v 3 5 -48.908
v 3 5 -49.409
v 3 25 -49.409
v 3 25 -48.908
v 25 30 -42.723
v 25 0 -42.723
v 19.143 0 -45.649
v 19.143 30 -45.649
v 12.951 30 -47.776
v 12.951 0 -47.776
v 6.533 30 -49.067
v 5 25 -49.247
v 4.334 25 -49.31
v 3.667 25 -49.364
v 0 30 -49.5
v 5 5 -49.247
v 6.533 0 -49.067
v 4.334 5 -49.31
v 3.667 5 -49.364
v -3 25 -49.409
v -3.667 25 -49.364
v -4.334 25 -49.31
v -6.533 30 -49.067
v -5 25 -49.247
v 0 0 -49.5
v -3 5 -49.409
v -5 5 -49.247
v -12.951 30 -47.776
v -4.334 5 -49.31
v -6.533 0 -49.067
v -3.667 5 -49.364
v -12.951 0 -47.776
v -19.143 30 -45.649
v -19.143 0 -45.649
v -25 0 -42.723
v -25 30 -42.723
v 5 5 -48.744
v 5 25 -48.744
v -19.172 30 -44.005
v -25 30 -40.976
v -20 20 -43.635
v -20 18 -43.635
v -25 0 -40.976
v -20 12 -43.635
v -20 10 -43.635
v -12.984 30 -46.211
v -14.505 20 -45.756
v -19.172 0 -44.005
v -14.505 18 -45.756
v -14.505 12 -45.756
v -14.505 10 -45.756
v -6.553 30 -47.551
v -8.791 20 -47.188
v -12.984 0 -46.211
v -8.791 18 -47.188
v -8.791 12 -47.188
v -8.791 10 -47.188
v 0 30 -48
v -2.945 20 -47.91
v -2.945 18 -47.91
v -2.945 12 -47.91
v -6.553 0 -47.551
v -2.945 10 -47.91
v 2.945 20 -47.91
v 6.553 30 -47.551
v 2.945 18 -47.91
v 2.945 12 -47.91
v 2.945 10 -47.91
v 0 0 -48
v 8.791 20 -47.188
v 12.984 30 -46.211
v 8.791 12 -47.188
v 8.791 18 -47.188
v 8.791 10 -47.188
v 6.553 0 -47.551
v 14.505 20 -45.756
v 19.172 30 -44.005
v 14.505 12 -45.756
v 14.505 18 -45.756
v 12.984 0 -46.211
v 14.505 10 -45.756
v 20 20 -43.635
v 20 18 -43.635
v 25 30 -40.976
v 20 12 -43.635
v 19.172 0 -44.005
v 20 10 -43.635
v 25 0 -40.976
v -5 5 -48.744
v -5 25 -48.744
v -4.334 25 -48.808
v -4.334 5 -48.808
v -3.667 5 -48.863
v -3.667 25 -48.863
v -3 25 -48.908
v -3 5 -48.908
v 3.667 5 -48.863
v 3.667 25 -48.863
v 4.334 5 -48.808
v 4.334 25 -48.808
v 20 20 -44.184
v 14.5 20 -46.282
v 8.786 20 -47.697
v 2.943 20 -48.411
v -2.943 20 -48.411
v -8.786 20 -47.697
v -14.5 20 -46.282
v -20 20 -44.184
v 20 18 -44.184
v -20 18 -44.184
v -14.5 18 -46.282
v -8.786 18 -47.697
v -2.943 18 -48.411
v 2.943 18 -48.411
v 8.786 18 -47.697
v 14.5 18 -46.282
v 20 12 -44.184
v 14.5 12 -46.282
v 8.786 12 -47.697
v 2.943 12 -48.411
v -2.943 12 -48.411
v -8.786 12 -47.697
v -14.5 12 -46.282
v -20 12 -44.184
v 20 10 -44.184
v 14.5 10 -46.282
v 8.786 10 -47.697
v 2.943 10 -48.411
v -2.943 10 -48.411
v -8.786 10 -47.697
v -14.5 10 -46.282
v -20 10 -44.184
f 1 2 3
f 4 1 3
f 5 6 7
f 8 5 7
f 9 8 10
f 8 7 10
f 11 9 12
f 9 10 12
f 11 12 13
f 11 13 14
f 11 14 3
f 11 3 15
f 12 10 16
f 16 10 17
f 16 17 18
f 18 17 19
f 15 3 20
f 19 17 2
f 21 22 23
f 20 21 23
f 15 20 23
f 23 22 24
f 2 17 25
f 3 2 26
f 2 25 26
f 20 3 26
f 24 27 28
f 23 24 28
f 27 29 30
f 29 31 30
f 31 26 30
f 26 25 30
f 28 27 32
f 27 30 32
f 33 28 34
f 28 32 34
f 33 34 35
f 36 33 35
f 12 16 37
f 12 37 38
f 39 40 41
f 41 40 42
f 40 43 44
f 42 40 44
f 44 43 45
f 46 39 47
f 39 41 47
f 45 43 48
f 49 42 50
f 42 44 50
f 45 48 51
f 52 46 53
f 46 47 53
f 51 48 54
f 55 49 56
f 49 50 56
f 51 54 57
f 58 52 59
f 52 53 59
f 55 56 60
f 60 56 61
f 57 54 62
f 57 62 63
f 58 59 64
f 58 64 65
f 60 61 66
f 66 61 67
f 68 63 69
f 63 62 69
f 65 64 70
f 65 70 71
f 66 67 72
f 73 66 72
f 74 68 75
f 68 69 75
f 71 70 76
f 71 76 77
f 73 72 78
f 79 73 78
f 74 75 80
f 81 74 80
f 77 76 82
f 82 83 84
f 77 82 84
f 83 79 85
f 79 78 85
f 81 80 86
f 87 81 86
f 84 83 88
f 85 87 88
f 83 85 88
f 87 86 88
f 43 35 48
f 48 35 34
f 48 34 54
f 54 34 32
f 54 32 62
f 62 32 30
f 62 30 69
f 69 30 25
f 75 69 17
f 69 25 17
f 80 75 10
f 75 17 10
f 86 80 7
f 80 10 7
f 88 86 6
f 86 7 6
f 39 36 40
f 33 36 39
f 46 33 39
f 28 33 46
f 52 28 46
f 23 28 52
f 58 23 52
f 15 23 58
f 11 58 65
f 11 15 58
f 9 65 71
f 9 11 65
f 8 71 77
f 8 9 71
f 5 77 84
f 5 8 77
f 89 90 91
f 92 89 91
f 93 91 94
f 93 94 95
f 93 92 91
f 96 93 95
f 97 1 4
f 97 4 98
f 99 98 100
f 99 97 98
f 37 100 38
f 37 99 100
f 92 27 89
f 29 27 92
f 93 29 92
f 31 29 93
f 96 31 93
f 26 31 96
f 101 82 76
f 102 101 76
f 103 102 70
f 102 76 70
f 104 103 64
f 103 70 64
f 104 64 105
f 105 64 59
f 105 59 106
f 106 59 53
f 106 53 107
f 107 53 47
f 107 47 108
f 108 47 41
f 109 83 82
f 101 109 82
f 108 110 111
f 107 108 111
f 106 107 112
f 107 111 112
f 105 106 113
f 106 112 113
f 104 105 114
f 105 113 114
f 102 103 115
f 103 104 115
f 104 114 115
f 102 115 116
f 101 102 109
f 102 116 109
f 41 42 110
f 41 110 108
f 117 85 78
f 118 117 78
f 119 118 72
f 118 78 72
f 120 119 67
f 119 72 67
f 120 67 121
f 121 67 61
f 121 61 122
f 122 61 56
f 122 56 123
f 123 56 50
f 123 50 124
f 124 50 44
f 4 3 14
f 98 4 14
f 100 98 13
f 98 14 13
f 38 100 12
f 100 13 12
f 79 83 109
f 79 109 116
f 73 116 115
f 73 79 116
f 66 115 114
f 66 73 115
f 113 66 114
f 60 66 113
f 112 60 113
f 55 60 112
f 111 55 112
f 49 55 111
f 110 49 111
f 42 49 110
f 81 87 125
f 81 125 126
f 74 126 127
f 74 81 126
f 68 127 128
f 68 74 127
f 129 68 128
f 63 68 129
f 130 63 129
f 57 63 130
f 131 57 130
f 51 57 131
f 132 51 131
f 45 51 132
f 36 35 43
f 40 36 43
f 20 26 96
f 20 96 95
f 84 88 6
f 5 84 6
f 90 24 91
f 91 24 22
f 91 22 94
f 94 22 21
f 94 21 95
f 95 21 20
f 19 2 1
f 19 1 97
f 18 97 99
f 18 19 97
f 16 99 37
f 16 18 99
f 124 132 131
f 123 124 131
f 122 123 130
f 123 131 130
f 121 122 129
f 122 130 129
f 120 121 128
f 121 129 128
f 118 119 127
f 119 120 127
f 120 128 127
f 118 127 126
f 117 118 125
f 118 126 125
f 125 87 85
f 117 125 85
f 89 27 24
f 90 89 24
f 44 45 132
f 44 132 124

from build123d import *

# Parameters (mm, degrees)
BOSS_EXTRUDE1_DEPTH      = 30
CUT_EXTRUDE28_REACH      = 65.05
CUT_EXTRUDE28_END_RADIUS = 48.5
SKETCH3_W                = 40
SKETCH3_H                = 2
CUT_EXTRUDE29_REACH      = 45.439
CUT_EXTRUDE29_END_RADIUS = 49
SKETCH5_W                = 2
SKETCH5_H                = 20


with BuildPart() as part:
    # Sketch2 → Boss-Extrude1 (new body)
    with BuildSketch(Plane(origin=(0, 0, 0), x_dir=(1, 0, 0), z_dir=(0, 1, 0))):
        with BuildLine():
            Line((-25, 42.722944655), (-25, 40.975602497))
            ThreePointArc((-25, 40.975602497), (0, 48), (25, 40.975602497))
            Line((25, 40.975602497), (25, 42.722944655))
            ThreePointArc((25, 42.722944655), (0, 49.5), (-25, 42.722944655))
        make_face()
    extrude(amount=BOSS_EXTRUDE1_DEPTH)

    # Cut-Extrude28: up to this cylinder (the profile starts inside it)
    cut_extrude28_end = Plane(origin=(0, 15, 0), z_dir=(0, -1, 0)) * Cylinder(CUT_EXTRUDE28_END_RADIUS, 236.1, mode=Mode.PRIVATE)
    # Sketch3 → Cut-Extrude28 (cut, up to the surface)
    with BuildSketch(Plane(origin=(0, 0, 0), x_dir=(-1, 0, 0), z_dir=(0, 0, -1)), mode=Mode.PRIVATE) as cut_extrude28_sk1:
        with Locations((0, 19)):
            Rectangle(SKETCH3_W, SKETCH3_H)
    cut_extrude28_tool1 = extrude(cut_extrude28_sk1.sketch, amount=CUT_EXTRUDE28_REACH, mode=Mode.PRIVATE) & cut_extrude28_end
    add(cut_extrude28_tool1.solids().sort_by_distance((0, 19, 0))[0], mode=Mode.SUBTRACT)
    # Sketch3 → Cut-Extrude28 (cut, up to the surface)
    with BuildSketch(Plane(origin=(0, 0, 0), x_dir=(-1, 0, 0), z_dir=(0, 0, -1)), mode=Mode.PRIVATE) as cut_extrude28_sk2:
        with Locations((0, 11)):
            Rectangle(SKETCH3_W, SKETCH3_H)
    cut_extrude28_tool2 = extrude(cut_extrude28_sk2.sketch, amount=CUT_EXTRUDE28_REACH, mode=Mode.PRIVATE) & cut_extrude28_end
    add(cut_extrude28_tool2.solids().sort_by_distance((0, 11, 0))[0], mode=Mode.SUBTRACT)

    # Cut-Extrude29: up to this cylinder (the profile starts outside it)
    cut_extrude29_end = Plane(origin=(0, 15, 0), z_dir=(0, -1, 0)) * Cylinder(CUT_EXTRUDE29_END_RADIUS, 189.878, mode=Mode.PRIVATE)
    # Sketch5 → Cut-Extrude29 (cut, up to the surface)
    with BuildSketch(Plane.XY.offset(-60), mode=Mode.PRIVATE) as cut_extrude29_sk1:
        with Locations((-4, 15)):
            Rectangle(SKETCH5_W, SKETCH5_H)
    cut_extrude29_tool1 = extrude(cut_extrude29_sk1.sketch, amount=CUT_EXTRUDE29_REACH, mode=Mode.PRIVATE) - cut_extrude29_end
    add(cut_extrude29_tool1.solids().sort_by_distance((-4, 15, -60))[0], mode=Mode.SUBTRACT)
    # Sketch5 → Cut-Extrude29 (cut, up to the surface)
    with BuildSketch(Plane.XY.offset(-60), mode=Mode.PRIVATE) as cut_extrude29_sk2:
        with Locations((4, 15)):
            Rectangle(SKETCH5_W, SKETCH5_H)
    cut_extrude29_tool2 = extrude(cut_extrude29_sk2.sketch, amount=CUT_EXTRUDE29_REACH, mode=Mode.PRIVATE) - cut_extrude29_end
    add(cut_extrude29_tool2.solids().sort_by_distance((4, 15, -60))[0], mode=Mode.SUBTRACT)


solid = part.part
